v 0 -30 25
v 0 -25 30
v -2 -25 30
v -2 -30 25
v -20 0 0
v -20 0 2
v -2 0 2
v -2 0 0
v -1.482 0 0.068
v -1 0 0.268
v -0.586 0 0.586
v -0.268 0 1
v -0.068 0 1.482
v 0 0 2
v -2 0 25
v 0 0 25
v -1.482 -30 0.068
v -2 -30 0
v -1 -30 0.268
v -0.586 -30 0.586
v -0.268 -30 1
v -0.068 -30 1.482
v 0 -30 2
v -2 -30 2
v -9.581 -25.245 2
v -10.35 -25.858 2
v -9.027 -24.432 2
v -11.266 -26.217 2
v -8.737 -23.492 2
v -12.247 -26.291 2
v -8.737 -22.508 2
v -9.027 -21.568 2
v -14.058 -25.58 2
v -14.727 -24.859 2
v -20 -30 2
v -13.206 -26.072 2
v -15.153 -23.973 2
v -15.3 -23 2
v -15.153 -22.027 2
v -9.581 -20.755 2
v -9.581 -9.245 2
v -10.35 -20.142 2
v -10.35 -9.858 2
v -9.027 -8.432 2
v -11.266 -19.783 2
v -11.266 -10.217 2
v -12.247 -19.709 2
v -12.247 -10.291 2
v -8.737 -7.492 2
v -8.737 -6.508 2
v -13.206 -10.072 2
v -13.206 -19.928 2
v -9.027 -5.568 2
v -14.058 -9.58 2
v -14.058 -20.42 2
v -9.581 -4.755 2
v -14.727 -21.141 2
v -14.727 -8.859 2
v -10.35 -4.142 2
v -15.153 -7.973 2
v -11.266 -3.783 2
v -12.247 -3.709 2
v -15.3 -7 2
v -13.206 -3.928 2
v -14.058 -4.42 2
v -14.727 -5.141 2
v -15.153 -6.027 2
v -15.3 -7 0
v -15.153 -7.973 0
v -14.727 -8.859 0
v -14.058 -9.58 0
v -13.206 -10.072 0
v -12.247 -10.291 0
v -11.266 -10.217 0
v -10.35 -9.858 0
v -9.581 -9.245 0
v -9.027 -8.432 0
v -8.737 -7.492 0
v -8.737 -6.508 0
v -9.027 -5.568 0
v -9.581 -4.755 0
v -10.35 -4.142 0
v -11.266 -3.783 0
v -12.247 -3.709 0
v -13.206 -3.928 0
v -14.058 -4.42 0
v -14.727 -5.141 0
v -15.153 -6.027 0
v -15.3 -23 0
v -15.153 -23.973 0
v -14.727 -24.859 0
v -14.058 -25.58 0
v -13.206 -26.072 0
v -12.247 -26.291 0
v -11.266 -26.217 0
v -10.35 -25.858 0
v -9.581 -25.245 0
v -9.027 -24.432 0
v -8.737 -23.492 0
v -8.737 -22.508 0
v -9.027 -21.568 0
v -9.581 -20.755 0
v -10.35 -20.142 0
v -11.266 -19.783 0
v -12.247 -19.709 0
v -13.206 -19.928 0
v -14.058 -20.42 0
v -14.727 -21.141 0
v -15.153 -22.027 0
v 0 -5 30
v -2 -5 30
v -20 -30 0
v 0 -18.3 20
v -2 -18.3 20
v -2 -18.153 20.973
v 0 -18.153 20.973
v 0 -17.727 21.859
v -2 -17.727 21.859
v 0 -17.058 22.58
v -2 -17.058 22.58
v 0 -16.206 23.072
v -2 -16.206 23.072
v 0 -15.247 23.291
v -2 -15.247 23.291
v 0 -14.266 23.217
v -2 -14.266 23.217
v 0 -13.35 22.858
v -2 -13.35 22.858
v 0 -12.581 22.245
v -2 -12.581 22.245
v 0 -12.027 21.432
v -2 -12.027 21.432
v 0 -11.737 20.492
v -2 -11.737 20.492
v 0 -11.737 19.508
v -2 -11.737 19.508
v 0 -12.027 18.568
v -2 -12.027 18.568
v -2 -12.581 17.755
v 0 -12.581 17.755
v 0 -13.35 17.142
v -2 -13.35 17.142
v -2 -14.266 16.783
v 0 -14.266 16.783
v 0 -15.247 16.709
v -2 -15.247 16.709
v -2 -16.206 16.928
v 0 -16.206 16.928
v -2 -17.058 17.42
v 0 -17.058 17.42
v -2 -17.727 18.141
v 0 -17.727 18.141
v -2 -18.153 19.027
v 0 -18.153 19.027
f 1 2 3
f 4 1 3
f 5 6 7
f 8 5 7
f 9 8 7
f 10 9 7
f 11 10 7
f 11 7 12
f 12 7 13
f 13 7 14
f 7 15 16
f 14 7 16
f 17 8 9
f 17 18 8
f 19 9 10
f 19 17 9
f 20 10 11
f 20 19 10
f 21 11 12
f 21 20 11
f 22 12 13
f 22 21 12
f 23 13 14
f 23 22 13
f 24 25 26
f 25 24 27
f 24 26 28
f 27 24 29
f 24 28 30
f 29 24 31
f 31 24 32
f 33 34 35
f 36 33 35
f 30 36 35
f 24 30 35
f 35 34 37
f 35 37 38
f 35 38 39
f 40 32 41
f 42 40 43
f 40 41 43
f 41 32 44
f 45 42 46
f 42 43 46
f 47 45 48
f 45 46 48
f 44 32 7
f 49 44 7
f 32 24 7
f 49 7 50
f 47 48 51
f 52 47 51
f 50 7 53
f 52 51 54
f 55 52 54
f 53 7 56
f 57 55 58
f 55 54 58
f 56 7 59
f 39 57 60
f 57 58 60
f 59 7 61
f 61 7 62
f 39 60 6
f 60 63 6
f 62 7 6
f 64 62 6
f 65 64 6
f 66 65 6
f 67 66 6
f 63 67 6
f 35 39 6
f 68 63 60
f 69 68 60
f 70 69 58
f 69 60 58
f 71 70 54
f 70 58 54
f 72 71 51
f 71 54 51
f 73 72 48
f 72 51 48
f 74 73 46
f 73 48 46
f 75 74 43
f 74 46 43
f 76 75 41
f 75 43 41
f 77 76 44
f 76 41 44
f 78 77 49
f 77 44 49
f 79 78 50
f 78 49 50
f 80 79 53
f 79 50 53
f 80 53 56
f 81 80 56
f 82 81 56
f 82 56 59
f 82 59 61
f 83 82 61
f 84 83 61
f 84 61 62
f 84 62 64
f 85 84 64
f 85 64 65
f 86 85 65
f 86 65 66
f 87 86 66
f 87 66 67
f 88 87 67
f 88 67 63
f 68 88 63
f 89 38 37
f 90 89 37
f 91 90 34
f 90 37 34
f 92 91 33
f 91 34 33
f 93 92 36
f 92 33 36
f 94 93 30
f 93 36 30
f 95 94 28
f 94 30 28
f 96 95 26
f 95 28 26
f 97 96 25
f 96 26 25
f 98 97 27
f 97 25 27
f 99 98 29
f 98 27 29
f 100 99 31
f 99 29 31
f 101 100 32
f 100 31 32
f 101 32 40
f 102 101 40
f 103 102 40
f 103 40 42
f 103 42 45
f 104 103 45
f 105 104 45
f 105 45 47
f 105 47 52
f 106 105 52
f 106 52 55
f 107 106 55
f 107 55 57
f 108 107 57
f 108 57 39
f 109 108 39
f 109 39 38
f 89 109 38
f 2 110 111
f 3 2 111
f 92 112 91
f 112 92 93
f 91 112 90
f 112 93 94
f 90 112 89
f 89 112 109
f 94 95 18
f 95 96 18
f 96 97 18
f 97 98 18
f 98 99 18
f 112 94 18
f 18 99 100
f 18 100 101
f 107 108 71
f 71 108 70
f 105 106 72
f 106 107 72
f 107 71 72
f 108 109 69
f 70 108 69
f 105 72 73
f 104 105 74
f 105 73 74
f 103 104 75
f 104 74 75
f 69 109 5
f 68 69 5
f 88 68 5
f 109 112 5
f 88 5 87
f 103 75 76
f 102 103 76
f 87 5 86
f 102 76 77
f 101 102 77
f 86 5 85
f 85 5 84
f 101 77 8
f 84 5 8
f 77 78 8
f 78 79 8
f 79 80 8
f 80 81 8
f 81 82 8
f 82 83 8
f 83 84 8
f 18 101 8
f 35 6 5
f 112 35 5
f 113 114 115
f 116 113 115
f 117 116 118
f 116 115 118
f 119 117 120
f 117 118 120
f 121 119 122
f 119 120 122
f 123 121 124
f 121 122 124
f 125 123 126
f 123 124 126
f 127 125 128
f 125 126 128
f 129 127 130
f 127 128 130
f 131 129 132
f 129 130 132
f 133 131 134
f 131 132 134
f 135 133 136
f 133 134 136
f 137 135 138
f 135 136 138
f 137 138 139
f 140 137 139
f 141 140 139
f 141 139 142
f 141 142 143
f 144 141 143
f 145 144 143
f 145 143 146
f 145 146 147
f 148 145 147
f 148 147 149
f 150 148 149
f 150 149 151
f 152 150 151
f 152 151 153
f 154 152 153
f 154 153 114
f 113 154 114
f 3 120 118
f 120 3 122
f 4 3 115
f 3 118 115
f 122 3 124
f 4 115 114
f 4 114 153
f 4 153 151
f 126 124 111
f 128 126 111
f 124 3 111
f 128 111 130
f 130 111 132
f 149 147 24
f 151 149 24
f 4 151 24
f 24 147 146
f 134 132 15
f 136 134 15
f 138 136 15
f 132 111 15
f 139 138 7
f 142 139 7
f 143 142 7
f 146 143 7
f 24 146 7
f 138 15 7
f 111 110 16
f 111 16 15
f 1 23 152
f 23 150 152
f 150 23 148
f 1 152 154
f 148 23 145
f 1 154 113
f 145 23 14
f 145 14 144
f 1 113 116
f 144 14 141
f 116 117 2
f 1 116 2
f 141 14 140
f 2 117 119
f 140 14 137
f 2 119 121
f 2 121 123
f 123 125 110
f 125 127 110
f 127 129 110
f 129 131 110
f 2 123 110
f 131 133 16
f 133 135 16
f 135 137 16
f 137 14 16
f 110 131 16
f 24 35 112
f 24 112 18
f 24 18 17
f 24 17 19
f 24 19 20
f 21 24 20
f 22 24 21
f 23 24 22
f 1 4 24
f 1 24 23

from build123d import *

# Parameters (mm, degrees)
F1_DEPTH = 30
F3_D     = 6.6
F5_D     = 6.6
F6_R     = 2
F7_SIZE  = 5


with BuildPart() as f1:
    # F0 (on Front) → F1 (new body)
    with BuildSketch(Plane.XZ):
        Polygon((-20, 0), (0, 0), (0, 30), (-2, 30), (-2, 2), (-20, 2), align=None)
    extrude(amount=F1_DEPTH)

    # F3 (through all)
    with Locations(Plane(origin=(0, 0, 0), x_dir=(1, 0, 0), z_dir=(0, 0, -1))):
        with Locations((-12, 23), (-12, 7)):
            Hole(F3_D / 2)

    # F5 (through all)
    with Locations(Plane.YZ):
        with Locations((-15, 20)):
            Hole(F5_D / 2)

    # F6
    f6_edges = [f1.edges().sort_by_distance(p)[0] for p in [
        (0, -15, 0),
    ]]
    fillet(f6_edges, radius=F6_R)

    # F7
    f7_edges = [f1.edges().sort_by_distance(p)[0] for p in [
        (-1, -30, 30),
        (-1, 0, 30),
    ]]
    chamfer(f7_edges, length=F7_SIZE)


solid = f1.part
